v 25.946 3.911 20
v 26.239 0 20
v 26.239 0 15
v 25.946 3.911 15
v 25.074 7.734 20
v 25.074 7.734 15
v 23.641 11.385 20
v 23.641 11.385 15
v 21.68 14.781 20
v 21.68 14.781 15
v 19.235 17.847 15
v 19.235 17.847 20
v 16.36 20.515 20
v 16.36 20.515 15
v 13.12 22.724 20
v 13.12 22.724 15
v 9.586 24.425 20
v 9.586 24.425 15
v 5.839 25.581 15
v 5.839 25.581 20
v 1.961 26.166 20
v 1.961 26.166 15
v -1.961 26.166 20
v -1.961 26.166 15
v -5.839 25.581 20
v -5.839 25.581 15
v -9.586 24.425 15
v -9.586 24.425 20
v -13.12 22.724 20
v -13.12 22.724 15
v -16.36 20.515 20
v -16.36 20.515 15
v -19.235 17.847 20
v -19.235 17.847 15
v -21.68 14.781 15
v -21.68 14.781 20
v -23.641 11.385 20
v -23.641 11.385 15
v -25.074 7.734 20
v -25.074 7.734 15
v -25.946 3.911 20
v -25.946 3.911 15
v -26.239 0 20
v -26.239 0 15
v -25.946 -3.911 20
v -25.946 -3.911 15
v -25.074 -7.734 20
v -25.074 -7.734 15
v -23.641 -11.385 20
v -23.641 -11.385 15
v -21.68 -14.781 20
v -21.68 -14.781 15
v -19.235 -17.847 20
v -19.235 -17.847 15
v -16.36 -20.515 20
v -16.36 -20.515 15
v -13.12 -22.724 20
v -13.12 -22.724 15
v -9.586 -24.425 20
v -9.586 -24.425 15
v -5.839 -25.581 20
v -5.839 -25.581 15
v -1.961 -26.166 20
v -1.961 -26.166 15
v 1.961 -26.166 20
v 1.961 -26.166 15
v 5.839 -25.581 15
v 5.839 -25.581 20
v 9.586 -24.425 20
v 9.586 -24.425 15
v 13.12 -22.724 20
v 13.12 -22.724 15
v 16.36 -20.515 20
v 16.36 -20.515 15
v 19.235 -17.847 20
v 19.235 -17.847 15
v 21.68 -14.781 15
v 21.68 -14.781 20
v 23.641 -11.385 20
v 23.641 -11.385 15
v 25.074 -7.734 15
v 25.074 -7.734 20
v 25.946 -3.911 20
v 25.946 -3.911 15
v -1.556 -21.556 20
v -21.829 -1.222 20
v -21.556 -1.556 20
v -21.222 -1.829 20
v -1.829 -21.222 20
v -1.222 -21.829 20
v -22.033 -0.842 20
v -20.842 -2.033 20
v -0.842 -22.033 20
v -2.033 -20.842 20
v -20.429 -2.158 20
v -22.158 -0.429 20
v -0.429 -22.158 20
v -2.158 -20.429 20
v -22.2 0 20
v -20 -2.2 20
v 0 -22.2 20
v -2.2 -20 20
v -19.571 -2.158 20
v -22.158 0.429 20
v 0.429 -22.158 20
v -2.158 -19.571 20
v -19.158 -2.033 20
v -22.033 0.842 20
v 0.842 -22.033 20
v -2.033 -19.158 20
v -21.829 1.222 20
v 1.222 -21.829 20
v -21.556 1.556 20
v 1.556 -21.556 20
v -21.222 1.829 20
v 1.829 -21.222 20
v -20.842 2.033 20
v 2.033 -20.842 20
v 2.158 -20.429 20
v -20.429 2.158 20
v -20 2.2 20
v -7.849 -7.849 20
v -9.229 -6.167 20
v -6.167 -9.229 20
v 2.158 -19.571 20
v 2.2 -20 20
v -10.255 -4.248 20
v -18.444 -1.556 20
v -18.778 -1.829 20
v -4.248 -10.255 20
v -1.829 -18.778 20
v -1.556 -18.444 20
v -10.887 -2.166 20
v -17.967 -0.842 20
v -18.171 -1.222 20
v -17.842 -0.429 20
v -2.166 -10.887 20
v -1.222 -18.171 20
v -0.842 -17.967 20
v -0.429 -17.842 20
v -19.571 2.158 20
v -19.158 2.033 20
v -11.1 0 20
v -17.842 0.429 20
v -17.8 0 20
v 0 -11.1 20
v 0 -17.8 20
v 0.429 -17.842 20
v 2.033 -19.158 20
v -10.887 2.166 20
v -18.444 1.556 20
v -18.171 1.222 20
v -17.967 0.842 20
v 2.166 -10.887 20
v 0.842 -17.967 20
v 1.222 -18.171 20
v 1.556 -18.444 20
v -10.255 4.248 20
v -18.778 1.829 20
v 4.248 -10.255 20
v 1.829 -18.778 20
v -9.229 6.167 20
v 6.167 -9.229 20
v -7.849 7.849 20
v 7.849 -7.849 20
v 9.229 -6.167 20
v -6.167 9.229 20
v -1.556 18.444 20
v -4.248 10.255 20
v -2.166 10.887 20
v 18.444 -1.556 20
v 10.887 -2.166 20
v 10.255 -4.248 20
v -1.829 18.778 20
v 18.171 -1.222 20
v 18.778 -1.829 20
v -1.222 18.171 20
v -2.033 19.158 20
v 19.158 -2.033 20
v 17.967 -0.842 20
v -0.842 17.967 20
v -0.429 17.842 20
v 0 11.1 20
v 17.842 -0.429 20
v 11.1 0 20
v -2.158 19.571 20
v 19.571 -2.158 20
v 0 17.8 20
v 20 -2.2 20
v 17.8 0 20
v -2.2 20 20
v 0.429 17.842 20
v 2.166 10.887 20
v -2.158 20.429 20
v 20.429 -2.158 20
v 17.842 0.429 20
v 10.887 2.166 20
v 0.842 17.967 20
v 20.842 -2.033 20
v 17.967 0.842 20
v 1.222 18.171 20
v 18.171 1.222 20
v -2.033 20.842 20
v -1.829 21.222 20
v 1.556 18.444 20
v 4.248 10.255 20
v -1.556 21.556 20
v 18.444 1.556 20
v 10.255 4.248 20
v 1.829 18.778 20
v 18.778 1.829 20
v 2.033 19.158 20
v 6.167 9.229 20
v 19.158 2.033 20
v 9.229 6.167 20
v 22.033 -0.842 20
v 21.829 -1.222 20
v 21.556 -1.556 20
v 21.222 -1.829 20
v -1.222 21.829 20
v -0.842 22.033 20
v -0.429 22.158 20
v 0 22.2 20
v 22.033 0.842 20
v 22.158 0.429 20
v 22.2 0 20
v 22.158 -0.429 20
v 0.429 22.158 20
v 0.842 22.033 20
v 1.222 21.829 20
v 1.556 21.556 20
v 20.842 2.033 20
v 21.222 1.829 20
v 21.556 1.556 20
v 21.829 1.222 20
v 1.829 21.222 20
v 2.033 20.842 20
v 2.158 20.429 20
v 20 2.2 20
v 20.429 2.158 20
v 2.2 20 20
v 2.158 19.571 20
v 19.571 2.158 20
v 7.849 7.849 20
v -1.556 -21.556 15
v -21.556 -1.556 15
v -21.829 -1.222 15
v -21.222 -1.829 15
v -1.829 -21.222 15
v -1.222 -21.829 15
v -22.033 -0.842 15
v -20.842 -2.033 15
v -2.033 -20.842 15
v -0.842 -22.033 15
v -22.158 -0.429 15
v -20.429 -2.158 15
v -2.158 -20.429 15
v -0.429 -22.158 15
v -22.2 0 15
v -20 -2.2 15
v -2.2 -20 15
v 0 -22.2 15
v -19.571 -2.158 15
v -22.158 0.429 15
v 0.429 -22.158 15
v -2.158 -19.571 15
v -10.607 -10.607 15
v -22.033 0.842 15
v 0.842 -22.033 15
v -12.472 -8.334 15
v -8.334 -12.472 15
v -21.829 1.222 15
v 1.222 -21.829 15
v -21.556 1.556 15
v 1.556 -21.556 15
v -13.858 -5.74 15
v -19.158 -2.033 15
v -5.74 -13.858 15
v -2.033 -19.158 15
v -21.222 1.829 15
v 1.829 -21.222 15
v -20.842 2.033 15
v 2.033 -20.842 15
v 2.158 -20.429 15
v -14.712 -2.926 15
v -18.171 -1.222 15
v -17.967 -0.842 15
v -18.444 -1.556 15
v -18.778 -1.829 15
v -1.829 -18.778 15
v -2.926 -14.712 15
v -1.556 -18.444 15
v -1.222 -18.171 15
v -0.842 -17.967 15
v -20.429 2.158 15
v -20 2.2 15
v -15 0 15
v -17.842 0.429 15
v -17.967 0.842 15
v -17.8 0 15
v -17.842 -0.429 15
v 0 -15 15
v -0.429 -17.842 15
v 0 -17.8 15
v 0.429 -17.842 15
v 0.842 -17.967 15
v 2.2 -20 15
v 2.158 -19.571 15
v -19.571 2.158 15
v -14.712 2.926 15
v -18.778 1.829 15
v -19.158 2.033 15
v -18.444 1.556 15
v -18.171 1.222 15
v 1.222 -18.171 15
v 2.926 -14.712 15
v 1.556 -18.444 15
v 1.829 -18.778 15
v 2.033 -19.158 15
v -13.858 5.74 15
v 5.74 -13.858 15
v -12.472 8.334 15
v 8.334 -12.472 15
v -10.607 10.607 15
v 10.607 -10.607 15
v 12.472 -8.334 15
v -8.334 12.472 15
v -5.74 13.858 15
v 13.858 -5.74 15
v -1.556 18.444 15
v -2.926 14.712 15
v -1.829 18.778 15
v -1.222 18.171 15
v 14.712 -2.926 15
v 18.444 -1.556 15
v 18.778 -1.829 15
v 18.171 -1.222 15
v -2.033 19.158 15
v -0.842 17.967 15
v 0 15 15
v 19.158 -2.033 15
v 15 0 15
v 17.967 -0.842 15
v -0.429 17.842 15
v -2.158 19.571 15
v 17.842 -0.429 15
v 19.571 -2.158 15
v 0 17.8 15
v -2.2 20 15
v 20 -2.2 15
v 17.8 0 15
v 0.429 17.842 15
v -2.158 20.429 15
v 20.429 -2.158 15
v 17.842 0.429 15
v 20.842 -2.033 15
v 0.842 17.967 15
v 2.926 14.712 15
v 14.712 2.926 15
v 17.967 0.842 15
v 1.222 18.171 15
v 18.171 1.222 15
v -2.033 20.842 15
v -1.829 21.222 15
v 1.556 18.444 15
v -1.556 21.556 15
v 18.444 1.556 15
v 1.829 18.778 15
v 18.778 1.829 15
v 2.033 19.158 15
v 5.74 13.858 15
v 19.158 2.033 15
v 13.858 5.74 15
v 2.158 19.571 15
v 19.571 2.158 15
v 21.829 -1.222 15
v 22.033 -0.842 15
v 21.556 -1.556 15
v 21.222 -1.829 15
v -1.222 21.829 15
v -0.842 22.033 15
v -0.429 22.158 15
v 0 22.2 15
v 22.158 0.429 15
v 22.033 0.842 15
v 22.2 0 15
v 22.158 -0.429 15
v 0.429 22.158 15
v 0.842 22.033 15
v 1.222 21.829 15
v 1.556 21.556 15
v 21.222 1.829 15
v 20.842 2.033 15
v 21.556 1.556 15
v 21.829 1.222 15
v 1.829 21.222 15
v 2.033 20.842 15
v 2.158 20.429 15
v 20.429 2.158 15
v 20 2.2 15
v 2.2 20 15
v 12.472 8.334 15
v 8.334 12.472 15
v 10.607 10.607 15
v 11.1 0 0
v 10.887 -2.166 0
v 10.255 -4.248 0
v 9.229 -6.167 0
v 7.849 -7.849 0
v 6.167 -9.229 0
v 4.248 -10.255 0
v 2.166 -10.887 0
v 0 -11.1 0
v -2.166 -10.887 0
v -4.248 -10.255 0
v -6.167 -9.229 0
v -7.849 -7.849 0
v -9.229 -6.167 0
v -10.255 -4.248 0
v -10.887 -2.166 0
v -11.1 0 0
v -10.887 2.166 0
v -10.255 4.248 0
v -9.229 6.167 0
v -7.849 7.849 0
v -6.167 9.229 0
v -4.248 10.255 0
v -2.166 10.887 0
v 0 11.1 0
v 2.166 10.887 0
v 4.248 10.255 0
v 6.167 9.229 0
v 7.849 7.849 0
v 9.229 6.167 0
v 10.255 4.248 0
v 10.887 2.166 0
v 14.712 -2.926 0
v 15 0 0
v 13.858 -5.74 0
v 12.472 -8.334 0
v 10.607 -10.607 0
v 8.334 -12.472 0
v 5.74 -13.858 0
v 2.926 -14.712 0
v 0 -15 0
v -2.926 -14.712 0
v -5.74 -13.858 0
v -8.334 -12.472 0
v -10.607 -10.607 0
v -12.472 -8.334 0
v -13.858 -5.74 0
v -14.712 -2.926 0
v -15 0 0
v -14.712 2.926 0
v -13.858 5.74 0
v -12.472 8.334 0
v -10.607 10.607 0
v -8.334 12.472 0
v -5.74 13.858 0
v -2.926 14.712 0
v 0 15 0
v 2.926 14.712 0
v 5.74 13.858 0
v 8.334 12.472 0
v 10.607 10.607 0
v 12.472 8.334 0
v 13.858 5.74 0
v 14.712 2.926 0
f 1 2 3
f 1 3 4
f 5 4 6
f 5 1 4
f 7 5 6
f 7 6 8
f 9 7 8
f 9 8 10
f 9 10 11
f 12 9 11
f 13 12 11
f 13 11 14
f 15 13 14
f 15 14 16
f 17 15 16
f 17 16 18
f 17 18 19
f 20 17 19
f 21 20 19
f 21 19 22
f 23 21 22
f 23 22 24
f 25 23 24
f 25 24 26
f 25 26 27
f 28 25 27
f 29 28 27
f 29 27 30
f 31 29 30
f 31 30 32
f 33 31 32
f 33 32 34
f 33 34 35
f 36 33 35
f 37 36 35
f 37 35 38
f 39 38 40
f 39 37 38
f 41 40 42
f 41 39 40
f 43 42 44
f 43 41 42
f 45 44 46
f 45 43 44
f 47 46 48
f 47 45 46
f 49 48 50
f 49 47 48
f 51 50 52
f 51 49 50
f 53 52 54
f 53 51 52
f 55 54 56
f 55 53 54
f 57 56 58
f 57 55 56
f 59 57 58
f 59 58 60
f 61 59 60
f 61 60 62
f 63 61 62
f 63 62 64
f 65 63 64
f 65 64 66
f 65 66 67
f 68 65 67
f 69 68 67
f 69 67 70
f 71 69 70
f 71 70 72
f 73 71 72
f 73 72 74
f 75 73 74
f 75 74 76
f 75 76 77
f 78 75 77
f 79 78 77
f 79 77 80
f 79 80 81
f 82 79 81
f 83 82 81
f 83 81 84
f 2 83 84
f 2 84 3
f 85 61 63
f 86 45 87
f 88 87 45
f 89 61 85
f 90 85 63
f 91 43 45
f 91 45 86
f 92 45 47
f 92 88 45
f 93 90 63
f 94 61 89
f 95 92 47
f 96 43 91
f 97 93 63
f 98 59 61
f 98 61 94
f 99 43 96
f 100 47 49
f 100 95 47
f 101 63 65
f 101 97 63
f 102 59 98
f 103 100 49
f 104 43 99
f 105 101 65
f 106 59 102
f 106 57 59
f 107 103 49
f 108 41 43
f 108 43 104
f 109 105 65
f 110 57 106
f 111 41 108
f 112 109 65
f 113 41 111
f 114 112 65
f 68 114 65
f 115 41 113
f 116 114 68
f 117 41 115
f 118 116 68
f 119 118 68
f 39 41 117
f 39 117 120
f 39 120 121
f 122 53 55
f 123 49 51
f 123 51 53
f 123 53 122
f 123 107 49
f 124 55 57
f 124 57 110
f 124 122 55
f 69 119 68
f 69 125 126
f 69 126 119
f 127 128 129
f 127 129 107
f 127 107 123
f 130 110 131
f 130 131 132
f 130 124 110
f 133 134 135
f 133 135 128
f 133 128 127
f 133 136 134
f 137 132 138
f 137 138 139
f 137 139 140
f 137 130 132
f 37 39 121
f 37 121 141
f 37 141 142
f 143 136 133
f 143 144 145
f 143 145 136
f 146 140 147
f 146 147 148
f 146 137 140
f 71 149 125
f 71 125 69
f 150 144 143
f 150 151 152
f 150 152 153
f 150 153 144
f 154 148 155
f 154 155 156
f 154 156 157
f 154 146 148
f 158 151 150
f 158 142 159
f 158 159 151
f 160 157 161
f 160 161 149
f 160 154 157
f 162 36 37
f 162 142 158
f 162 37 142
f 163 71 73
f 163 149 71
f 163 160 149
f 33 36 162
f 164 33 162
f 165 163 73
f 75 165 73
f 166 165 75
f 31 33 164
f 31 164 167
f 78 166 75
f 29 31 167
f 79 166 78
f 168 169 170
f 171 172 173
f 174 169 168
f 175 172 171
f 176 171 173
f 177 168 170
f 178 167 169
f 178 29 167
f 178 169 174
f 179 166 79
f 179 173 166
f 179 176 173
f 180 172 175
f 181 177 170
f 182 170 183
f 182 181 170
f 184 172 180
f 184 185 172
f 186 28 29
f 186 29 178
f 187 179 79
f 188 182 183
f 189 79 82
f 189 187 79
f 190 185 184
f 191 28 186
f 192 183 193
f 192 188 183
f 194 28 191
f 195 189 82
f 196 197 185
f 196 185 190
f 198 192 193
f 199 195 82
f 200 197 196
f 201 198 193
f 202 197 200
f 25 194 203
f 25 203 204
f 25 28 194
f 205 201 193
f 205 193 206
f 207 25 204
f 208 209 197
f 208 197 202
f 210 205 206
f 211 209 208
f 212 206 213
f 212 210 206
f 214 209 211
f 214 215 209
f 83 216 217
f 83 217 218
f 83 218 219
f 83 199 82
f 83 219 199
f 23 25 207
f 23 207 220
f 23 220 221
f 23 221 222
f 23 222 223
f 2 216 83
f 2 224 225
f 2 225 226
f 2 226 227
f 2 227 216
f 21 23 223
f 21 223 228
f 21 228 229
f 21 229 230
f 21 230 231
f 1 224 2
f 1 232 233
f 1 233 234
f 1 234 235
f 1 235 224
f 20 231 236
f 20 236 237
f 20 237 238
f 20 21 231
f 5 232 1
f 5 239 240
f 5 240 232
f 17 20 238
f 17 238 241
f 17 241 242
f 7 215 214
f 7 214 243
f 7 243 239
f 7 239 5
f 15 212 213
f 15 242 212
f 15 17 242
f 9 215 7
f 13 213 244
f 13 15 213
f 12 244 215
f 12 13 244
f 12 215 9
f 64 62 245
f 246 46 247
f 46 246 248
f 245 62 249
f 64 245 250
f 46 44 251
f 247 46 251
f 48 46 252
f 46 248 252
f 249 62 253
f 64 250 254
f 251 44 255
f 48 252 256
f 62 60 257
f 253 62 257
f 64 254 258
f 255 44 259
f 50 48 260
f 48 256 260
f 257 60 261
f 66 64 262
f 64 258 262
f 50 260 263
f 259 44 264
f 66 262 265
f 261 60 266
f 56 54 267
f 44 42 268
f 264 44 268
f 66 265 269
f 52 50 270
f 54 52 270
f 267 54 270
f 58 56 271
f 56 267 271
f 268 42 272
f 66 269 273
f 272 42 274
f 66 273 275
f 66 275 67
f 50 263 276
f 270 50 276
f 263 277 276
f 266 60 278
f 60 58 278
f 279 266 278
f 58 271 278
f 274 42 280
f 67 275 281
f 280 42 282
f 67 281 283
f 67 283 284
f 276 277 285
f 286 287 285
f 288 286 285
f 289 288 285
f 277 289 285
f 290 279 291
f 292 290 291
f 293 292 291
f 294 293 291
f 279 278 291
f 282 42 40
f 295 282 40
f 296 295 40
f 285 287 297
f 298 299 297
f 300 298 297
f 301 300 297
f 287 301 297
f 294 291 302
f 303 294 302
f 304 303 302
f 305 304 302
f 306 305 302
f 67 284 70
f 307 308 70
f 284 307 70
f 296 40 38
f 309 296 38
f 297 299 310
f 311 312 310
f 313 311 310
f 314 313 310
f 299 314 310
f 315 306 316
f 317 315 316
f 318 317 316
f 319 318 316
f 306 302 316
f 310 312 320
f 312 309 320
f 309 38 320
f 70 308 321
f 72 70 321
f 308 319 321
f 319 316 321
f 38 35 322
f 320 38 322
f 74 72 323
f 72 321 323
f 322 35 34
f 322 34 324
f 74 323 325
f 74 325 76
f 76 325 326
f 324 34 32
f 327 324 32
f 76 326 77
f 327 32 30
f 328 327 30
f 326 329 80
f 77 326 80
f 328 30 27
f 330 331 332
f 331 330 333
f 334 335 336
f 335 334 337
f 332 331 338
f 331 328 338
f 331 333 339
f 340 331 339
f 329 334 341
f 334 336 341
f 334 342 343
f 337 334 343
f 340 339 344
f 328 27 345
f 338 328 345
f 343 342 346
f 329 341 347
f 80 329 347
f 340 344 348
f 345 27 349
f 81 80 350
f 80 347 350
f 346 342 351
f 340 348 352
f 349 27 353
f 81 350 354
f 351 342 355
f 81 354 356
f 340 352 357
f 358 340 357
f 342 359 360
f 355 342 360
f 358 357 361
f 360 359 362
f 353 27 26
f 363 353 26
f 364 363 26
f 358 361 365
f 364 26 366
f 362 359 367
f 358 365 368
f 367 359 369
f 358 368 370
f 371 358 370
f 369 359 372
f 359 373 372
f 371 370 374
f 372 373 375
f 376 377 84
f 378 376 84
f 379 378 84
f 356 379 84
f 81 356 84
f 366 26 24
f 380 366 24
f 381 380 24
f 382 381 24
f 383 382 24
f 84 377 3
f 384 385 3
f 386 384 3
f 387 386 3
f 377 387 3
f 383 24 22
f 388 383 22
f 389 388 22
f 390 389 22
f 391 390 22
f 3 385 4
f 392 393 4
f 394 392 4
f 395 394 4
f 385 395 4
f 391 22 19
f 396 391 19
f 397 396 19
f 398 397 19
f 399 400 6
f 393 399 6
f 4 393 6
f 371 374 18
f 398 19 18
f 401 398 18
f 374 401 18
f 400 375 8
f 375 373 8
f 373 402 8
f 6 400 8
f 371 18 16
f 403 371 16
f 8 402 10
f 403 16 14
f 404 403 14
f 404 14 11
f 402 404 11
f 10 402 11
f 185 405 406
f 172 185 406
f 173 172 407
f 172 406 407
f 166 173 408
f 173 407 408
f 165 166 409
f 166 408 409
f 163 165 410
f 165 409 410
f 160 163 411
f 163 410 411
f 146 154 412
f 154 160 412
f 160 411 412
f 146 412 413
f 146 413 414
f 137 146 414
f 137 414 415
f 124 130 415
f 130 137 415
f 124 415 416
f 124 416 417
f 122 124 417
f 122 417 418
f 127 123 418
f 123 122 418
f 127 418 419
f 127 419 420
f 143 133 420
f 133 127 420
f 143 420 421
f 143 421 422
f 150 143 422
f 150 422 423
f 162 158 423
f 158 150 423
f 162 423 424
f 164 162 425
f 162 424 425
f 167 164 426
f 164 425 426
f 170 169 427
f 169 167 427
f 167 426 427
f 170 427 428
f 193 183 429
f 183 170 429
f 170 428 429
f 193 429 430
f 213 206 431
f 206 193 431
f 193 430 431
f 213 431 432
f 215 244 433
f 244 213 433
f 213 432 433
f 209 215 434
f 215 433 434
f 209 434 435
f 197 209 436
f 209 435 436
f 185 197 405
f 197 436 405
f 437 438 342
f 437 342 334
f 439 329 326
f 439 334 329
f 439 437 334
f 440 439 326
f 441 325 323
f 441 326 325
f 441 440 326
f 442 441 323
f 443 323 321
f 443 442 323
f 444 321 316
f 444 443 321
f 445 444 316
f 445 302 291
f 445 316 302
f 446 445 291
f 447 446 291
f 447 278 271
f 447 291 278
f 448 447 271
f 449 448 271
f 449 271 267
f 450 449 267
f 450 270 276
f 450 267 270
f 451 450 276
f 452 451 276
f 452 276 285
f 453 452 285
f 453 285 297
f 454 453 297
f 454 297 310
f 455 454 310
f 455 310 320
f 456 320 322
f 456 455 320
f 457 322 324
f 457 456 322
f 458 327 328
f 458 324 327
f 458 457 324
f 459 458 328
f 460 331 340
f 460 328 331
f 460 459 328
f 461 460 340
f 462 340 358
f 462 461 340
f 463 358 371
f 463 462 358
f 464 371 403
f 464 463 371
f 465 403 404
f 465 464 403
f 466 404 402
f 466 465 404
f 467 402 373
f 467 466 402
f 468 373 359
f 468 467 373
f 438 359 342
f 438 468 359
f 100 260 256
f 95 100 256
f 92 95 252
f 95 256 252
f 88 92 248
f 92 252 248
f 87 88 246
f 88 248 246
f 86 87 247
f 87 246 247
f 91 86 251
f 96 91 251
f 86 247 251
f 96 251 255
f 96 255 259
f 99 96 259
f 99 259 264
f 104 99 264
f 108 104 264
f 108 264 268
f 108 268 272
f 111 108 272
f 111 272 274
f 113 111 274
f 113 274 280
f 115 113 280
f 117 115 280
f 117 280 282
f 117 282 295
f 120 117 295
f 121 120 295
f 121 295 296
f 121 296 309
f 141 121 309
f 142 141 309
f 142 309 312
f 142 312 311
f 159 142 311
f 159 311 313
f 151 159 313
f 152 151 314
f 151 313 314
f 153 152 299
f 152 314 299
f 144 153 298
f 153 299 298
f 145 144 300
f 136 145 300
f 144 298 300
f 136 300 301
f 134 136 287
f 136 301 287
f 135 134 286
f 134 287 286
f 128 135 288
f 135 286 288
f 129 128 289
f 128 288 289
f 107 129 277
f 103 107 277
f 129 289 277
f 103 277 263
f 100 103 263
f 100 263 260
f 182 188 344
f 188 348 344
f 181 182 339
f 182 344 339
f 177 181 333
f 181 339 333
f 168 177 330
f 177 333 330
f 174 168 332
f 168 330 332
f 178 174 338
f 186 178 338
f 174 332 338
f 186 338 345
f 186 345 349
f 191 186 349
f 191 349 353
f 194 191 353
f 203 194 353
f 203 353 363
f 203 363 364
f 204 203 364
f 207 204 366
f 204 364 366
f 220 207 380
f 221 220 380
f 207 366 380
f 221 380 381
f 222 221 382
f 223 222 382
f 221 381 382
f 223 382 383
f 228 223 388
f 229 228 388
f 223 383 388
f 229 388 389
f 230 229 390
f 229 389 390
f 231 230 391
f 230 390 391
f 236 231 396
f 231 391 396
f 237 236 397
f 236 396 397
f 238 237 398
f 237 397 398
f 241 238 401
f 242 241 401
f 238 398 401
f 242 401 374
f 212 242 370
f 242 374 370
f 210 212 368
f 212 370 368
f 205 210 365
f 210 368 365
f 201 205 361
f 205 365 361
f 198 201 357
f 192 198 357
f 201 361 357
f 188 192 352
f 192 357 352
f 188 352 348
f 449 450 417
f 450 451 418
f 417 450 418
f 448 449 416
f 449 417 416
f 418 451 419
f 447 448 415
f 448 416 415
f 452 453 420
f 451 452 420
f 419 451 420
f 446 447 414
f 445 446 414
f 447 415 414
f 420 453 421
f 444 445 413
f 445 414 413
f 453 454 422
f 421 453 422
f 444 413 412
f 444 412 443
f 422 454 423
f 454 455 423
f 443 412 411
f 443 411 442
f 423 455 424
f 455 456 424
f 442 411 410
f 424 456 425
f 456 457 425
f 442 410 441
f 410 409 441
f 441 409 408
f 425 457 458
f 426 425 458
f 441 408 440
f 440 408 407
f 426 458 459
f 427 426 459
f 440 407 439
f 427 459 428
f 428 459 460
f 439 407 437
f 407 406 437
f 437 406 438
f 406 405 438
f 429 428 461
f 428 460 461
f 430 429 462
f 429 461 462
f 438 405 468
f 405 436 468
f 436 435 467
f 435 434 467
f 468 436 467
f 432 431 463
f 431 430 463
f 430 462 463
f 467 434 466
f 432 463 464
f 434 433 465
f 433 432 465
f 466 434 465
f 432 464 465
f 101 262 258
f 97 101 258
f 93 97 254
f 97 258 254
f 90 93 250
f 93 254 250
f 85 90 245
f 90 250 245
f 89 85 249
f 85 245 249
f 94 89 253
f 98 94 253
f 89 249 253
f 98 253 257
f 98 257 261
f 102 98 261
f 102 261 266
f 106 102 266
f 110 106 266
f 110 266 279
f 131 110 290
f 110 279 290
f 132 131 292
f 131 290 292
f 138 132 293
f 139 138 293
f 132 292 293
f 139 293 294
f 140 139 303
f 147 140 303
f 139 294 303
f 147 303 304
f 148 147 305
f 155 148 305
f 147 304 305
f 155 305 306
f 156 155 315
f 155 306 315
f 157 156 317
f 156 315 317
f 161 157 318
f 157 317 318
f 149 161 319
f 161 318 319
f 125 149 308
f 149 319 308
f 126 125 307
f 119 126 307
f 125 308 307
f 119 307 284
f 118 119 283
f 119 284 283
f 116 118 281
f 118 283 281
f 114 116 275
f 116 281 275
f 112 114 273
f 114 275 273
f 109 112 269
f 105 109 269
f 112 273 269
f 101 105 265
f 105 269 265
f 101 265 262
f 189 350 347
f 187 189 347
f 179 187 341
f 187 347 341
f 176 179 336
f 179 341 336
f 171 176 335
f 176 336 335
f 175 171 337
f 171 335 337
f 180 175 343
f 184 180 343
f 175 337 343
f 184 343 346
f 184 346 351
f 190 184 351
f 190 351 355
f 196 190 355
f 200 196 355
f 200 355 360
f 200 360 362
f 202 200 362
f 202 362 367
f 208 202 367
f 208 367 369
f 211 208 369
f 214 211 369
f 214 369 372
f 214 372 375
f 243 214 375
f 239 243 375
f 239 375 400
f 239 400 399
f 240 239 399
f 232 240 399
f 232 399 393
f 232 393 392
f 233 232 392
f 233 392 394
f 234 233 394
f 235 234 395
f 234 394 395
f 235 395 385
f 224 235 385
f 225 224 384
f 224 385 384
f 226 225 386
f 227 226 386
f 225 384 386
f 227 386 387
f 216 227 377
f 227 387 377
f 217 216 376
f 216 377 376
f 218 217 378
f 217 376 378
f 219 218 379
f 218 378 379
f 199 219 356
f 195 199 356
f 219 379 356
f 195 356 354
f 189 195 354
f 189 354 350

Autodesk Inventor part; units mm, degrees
ref_plane "YZ Plane" through (0, 0, 0) normal (1, 0, 0) x (0, 1, 0)
ref_plane "XZ Plane" through (0, 0, 0) normal (0, 1, 0) x (-1, 0, 0)
ref_plane "XY Plane" through (0, 0, 0) normal (0, 0, 1) x (1, 0, 0)
sketch "Skizze1" plane through (0, 0, 0) normal (0, 0, 1) x (1, 0, 0)
  circle A0 centre (0, 0) radius 15
  circle A1 centre (0, 0) radius 11.1
  dimension "d0" = 30
  dimension "d1" = 22.2
extrude "Extrusion1" add sketch "Skizze1" along normal blind 20
sketch "Skizze2" plane through (0, 0, 20) normal (0, 0, 1) x (1, 0, 0)
  circle A0 centre (0, 0) radius 15 projected
  circle A1 centre (0, 0) radius 11.1 projected
  circle A2 centre (0, 0) radius 26.2393
  circle A3 centre (0, 0) radius 15
extrude "Extrusion2" add sketch "Skizze2" against normal blind 5 contours A2
sketch "Skizze3" plane through (0, 0, 20) normal (0, 0, 1) x (1, 0, 0)
  circle A0 centre (0, 0) radius 26.2393 projected
  line L0 (-36.7351, 0) -> (36.7351, 0) projected
  line L1 (0, -36.7351) -> (0, 36.7351) projected
  point P0 (0, 20)
  point P1 (-20, 0)
  point P2 (0, -20)
  point P3 (20, 0)
  dimension "d6" = 20
  dimension "d7" = 20
  dimension "d8" = 20
  dimension "d9" = 20
hole "Bohrung1" at (0, 20, 20) at (-20, 0, 20) at (0, -20, 20) at (20, 0, 20) direction (0, 0, -1) diameter 4.4 end through all
properties part number "Cameralager21.8"
